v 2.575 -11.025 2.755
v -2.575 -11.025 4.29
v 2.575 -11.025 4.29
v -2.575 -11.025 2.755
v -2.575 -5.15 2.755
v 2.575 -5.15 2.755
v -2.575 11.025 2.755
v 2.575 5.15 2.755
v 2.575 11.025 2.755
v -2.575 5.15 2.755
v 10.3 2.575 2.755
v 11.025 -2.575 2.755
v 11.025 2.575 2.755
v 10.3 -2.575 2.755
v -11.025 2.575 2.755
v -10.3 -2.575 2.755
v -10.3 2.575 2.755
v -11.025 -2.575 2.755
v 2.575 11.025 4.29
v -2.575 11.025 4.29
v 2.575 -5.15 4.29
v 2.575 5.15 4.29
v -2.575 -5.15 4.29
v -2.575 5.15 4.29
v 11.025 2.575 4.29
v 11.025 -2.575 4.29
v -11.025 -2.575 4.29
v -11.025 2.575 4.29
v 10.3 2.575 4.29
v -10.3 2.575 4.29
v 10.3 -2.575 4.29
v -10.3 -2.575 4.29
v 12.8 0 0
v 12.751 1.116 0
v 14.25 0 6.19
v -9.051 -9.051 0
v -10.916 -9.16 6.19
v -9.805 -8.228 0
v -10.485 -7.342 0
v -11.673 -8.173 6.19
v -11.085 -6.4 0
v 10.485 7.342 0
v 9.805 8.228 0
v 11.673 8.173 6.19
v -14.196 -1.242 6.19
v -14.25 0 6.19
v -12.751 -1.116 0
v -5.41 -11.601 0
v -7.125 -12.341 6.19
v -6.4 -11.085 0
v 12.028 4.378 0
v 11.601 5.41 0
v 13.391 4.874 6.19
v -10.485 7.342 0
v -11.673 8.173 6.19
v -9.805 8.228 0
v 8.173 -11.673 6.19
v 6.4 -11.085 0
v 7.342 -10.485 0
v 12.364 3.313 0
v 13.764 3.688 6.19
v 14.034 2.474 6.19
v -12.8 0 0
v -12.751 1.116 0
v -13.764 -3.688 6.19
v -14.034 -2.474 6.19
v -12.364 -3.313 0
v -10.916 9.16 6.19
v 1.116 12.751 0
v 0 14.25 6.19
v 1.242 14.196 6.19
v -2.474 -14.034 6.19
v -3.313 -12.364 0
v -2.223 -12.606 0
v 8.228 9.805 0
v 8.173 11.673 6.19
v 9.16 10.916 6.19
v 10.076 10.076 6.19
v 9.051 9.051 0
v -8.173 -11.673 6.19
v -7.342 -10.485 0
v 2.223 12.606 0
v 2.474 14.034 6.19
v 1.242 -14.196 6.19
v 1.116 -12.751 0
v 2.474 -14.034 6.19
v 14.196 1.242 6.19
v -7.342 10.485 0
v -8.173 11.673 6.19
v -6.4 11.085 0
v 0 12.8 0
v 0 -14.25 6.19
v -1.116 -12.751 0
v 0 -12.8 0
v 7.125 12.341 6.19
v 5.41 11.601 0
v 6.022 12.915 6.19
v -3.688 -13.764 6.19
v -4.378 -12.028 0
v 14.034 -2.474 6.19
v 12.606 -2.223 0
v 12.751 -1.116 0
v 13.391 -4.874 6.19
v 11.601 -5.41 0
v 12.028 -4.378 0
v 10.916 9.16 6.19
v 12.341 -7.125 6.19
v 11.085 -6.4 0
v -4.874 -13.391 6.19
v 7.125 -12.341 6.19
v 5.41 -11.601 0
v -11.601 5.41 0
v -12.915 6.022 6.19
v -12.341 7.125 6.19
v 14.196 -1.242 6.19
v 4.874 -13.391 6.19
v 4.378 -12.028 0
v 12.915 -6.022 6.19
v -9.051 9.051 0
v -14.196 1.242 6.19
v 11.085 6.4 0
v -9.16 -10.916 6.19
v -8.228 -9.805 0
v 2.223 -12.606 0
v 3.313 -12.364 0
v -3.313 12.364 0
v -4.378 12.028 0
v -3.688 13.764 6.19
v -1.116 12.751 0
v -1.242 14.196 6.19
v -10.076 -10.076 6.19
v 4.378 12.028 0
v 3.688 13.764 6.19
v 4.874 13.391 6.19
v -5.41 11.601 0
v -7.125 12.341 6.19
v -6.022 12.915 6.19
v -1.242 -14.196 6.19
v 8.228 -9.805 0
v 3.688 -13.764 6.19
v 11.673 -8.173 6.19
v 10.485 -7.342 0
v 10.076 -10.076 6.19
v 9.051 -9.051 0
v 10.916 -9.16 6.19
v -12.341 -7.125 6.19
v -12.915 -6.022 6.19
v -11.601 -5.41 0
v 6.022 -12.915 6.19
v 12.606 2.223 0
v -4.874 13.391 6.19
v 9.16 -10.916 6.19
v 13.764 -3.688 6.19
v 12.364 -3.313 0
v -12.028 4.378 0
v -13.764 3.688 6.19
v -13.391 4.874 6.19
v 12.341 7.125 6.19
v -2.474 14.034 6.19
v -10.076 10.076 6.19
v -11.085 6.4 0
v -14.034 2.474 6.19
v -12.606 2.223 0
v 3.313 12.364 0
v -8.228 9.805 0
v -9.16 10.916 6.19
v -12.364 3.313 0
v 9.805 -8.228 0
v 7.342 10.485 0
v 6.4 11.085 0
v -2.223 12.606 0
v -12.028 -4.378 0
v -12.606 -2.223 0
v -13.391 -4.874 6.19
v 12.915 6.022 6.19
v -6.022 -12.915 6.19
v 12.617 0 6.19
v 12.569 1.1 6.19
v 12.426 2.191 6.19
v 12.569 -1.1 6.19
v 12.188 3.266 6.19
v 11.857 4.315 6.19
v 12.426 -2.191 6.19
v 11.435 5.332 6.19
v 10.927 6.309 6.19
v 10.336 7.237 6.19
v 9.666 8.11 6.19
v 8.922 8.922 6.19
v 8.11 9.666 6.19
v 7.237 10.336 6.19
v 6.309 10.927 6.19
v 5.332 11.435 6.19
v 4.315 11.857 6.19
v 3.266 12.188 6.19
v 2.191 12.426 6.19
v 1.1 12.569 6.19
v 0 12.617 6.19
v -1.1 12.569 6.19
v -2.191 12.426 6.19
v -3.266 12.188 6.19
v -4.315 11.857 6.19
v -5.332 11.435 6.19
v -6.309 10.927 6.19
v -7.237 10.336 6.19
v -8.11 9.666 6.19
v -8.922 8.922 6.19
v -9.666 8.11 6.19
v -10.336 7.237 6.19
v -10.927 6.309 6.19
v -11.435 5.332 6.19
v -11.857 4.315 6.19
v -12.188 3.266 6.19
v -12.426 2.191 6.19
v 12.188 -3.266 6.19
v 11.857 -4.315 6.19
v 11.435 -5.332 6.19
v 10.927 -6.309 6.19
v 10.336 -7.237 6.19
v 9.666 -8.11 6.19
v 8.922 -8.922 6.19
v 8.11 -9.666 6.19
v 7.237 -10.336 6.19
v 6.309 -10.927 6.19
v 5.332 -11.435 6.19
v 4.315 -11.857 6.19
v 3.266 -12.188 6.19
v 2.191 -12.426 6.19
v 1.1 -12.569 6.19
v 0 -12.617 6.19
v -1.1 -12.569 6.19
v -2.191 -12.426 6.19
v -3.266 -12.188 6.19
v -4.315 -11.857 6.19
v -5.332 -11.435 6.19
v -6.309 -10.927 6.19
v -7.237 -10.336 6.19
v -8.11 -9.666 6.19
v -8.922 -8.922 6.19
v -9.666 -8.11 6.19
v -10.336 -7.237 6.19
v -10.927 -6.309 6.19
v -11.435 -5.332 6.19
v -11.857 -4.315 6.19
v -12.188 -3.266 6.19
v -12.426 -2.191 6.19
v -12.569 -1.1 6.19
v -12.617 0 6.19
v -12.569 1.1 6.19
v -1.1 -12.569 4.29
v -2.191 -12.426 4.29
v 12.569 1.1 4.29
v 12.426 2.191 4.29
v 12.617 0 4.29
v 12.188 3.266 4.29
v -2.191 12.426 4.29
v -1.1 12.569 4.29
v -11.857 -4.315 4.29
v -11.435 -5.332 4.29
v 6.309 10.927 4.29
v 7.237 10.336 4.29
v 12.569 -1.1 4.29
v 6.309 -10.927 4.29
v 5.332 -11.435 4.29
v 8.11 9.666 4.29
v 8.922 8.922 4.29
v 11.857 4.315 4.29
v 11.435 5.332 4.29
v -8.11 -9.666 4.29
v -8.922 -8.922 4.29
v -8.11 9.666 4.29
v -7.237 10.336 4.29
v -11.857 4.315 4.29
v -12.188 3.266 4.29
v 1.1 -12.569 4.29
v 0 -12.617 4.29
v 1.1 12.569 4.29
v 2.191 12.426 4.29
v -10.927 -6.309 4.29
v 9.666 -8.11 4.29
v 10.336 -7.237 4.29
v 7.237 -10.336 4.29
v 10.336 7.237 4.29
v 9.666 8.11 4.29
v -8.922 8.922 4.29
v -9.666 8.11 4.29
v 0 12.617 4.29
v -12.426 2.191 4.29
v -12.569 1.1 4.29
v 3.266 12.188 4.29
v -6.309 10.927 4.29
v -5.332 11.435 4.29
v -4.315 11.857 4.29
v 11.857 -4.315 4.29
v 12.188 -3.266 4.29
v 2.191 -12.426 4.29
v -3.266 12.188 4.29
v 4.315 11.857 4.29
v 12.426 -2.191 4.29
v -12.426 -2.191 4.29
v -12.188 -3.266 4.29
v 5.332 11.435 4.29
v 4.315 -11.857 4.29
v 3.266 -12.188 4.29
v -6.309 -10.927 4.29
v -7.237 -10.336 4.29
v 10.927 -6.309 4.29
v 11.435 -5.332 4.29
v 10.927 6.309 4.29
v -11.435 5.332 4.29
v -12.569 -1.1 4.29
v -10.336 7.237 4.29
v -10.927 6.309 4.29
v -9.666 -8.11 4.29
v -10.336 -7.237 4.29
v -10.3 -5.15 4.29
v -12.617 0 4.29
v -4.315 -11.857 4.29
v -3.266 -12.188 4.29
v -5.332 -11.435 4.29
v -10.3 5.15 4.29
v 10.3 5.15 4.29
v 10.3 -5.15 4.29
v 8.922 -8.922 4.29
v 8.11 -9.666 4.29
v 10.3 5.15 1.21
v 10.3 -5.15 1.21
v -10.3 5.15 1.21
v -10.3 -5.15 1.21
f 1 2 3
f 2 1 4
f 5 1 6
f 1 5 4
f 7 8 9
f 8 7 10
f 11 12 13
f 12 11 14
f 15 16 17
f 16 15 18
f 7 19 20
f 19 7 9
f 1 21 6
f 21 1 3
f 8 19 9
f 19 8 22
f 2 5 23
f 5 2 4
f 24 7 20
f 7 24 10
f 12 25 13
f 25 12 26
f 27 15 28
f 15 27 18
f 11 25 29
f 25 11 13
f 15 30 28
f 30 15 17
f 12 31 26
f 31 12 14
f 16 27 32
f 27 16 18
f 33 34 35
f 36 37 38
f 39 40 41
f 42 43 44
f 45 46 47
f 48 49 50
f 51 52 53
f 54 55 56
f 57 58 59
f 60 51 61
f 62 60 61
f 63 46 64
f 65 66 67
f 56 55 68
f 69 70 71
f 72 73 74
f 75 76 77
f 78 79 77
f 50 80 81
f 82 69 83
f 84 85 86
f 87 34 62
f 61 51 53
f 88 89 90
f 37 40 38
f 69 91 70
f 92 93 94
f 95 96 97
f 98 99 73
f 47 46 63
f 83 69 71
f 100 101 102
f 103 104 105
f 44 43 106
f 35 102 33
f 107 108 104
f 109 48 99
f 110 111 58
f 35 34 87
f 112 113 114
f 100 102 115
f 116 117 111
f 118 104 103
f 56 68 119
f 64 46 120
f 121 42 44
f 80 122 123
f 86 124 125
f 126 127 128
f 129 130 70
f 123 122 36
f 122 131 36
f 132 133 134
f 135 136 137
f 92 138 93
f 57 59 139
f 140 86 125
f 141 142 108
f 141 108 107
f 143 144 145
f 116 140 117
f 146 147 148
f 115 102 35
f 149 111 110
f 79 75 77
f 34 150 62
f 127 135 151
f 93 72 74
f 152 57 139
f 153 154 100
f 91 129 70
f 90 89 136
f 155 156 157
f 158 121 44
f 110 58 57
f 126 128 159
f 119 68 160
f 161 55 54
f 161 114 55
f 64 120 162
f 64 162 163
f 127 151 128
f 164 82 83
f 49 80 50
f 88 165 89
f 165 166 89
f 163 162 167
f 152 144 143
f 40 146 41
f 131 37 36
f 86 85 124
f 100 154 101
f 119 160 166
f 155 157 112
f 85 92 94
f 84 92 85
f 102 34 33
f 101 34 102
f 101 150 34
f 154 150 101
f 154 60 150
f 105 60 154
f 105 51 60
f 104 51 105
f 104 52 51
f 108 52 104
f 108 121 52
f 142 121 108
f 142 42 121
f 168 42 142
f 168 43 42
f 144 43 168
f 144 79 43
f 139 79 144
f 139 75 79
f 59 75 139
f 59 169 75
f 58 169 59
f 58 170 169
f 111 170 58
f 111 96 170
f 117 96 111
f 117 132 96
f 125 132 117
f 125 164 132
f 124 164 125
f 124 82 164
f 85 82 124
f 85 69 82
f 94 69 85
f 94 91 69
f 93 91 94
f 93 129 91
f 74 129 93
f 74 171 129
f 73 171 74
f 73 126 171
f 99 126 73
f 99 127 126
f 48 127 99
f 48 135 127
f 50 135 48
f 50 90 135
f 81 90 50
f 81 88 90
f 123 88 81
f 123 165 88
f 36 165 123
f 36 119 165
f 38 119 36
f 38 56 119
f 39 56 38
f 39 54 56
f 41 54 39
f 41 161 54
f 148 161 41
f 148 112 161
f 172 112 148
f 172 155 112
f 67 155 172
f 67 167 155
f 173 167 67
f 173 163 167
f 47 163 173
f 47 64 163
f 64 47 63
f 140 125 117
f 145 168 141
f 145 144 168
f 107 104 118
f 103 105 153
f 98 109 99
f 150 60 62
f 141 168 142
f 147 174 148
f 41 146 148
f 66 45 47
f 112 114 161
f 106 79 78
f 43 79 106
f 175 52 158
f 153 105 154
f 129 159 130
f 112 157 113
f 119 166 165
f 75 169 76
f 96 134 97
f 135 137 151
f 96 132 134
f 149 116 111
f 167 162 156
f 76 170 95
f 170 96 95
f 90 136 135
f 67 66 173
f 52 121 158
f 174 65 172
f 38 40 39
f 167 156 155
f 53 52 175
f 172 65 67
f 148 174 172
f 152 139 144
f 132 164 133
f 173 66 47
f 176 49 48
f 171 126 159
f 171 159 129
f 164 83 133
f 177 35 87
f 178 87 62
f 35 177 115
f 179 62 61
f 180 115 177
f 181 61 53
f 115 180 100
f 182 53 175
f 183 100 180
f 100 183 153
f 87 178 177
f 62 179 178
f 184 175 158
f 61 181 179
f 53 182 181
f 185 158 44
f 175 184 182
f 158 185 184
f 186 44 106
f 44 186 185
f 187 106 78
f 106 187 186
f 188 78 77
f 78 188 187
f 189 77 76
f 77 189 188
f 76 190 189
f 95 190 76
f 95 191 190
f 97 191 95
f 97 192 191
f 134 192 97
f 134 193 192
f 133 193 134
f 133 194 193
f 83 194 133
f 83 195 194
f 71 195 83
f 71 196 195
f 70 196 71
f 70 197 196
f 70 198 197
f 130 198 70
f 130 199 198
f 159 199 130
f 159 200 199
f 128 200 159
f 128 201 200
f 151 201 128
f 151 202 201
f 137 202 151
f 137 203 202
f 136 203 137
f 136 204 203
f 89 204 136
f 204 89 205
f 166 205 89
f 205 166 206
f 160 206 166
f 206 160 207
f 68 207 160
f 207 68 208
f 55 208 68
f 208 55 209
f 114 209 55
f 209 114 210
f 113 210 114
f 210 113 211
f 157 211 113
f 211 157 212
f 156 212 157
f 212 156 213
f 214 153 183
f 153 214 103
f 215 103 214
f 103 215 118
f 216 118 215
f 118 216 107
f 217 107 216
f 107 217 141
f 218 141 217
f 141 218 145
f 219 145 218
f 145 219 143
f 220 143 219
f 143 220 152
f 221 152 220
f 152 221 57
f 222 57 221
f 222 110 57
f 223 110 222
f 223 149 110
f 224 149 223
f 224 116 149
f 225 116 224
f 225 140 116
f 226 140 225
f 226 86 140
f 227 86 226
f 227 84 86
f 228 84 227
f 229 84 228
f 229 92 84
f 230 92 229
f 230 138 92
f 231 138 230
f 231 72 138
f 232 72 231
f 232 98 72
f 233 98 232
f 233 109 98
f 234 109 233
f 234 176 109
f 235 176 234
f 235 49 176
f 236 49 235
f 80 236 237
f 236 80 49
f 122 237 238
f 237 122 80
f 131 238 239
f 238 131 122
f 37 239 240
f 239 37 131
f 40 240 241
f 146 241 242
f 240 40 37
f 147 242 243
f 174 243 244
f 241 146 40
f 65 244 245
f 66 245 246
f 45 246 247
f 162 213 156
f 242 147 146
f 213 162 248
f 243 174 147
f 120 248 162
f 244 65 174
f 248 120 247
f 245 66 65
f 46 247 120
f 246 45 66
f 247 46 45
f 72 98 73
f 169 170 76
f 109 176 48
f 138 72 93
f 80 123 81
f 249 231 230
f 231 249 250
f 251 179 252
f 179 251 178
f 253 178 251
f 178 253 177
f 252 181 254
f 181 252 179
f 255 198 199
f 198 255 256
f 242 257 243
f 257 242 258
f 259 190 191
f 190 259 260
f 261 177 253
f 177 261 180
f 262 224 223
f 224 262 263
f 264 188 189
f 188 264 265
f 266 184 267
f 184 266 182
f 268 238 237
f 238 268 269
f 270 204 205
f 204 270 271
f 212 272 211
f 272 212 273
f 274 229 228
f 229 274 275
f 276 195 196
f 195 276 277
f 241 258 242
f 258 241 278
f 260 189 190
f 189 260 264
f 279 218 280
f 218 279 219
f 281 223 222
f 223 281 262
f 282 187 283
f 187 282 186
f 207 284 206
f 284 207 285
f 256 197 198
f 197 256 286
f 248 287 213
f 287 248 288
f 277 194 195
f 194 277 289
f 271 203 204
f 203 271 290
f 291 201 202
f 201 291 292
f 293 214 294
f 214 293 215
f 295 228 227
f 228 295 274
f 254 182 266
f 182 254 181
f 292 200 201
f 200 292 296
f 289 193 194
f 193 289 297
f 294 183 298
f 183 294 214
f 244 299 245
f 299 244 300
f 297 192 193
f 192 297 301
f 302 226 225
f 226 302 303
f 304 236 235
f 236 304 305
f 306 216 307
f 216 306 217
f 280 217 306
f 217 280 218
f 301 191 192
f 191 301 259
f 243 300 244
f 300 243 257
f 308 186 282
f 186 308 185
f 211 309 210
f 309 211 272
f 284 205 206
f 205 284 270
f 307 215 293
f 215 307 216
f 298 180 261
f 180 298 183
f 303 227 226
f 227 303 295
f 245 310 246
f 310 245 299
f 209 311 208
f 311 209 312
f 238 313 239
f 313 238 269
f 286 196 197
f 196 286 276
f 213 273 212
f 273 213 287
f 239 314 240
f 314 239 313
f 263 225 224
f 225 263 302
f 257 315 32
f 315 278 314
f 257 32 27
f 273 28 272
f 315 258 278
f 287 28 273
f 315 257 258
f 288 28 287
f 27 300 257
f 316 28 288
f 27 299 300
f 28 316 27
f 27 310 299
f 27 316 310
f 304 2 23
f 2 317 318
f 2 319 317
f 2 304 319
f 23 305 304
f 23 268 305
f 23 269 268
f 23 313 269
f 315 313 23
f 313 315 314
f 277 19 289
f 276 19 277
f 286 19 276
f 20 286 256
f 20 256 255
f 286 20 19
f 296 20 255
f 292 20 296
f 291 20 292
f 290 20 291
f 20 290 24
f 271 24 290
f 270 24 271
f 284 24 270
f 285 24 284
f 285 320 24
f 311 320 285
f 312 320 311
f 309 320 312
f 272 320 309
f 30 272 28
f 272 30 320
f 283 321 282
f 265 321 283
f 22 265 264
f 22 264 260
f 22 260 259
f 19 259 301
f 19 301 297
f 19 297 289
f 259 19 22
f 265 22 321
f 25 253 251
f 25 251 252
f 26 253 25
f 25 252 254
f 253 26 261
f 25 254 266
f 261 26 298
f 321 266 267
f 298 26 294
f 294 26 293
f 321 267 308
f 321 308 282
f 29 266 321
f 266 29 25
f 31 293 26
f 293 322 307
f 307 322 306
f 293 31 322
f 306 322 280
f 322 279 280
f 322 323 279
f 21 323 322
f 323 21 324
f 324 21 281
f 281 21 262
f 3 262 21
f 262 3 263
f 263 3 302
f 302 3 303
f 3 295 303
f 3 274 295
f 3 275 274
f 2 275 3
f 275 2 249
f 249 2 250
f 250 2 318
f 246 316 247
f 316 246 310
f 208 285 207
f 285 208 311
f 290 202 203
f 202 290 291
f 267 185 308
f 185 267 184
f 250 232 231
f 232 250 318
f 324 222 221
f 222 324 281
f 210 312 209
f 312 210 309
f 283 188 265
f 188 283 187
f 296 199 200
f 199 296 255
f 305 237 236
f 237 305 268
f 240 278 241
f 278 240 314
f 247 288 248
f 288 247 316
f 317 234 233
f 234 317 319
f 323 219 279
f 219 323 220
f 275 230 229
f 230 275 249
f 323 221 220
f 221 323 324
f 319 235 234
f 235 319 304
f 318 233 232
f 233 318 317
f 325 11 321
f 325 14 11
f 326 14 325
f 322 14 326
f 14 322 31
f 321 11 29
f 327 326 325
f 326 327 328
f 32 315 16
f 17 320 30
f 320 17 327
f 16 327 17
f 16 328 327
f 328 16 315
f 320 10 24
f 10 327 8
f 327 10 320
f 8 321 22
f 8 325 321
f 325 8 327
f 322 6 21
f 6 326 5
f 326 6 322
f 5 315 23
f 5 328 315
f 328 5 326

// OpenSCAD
// [FL_INDEX: keywords="openscad, 3d_parametric, Coin_Magnet, csg_solid" | COT="Parametric OpenSCAD design from 3DCodeverse"]
// Title: Coin Magnet

/*
Coin Magnet Holder
Version 3 - 26 July 2015
Created by Aaron Ciuffo - txoof.com

This SCAD can produce a plate with many coins.  See the example at the bottom.

Many coins are already available; add more using this format:
//ISO4217_name<value>=[Diameter, Thickness]

Check the examples below.

To draw a single coin holder call (the function expects a list of lists)
  drawCoinHolder([[coinDiameter, coinThickness]]);
  

To draw a plate of several holders call:
  drawCoinHolder([coinvar1, coinvar2, coinvar3]);

!!!NOTE!!! the largest coin must be the first item in the list!



Adjust the magnet variables for your particlar magnet.  If your magnet does not
quite fit after printing, adjust the 'ovr' variable in the Tweaks section.



*/

/* [Variables] */

//Coin Diameter
coinDia=24.5;
//Coin Thickness
coinThick=1.9;


/*[Design]*/
//Border around coin
border=2;


/*[Magnet Dimensions]*/
//Magnet X - Longest dimension
magnetX=20;
//Magnet Y
magnetY=10;
//Magnet Z
magnetZ=3;
//Magnet Base Base Thickness
baseThick=1.2;

/*[Layout]*/
separation=5;

/*[Tweak]*/
//You may need to tweak this if you find your magnets do not fit.  
//Increase this variable to make more space, decrease it to make fits more tight.
ovr=1.03;

/*[Hidden]*/
magX=magnetX*ovr;
magY=magnetY*ovr;
magZ=magnetZ*ovr;

//Canadian dollar - CAD
cad1=[26.5, 2];
cad2=[27.95, 1.75];
cadp25=[24, 1.6];

//French Community of Africa - CFA
cfa10=[23.5, 1.5];
cfa50=[22, 1.7];
cfa200=[24.5, 1.9];

//Danish krone - DKK
dkk5=[28.5, 2];

//Spanish Pesetas - ESP
esp100=[24.5, 2.9];

//French franc - FRF
frf1=[24,1.9];

//Great Britian Pound - GBP
gbpp02=[26, 2.1];

//Greek drachma - GRD
grd50=[27.5, 2.2];
grd100=[29.5, 2.2];

//Icelanding Krone ISK
isk100=[25.6, 2.3];
isk50=[23.05, 2.7]; 
isk10=[27.55, 1.8];
isk5=[24.55, 1.8];
isk1=[21.5, 1.7];

//Irsih pound - IEP
iepp02=[26, 2];
iepp20=[27.1, 2];
//non round! - distance from point/point (even sided), or point/flat (odd sided)
iepp50=[30.5, 2.5, 7];
iep1=[31.1, 1.9];


//Italian lira - ITL
itl200=[24, 1.7];

//Lebanese pound - LBP
lbp500=[24.5, 2.15];

//Mexican Peso - MXN
mxn10=[28, 2.3];

//Dutch guilder - NLG
nlg1=[24.5, 1.9];

//Norwegian kroner - NOK
nok1=[21, 1.7];
nok5=[26, 2.15];
nok10=[24, 2.5];
nok20=[27.55, 2.5];

//Thai baht - THB
thb5=[24, 2.2];

//Turkish lira - TRY
try1=[26.25, 2];
tryp5=[23.9, 2];

//United States dollar - USD
usdp25=[24.3, 1.75];
usd1=[26.5, 2.1];



module drawCoinHolder(coinDim) {
  coinD=coinDim[0];
  coinZ=coinDim[1];
  cutOvr=.01; //add a little bit to fight ZFighting
  magBorder=5; //Consider calculating this form something or other
  $fn=72;
  height=coinZ+magZ+baseThick;
  difference() {
    //create external cone - add 
    cylinder(h=height, 
      r2=(coinD+(border*2))/2,  
      r1=(magX+magBorder)/2);

    //cut void for coin
    translate([0, 0, coinZ+magZ+baseThick-coinZ])
      color("red")
      cylinder(h=coinZ+cutOvr, r=coinD*ovr/2);

    //cut void for magnet
    translate([0, 0, magZ/2+baseThick+cutOvr])
      color("blue")
      cube([magX, magY, magZ], center=true);
    
    //cut void for glue grooves
    groove=[coinD*.9, magY*.5, magZ*.5];
    for (i=[-1, 0]) {
      rotate([0, 0, 90*i])
        color("yellow")
        translate([0, 0, height-coinZ-groove[2]/2+cutOvr])
        cube(groove, center=true);
    }

  }

}

module draw_nonround_holder(coinDim) {
  coinT=coinDim[1];
  coinSides=coinDim[2];
  coinD=2*(coinDim[0]/(cos((360/(2*coinSides)))+1));
  echo(coinD);
  difference () {
    // create external cylinder
    cylinder(h=coinT+magZ+.9, r2=(coinD+4)/2,  r1=((coinD+2.5)/2)*.8, $fn=36); 
    // cut out internal space for coin
    translate([0,0,magZ+.9]) cylinder(h=coinT*3, r=(coinD+.7)/2, $fn=coinSides);
    // cut out slot for magnet
    translate([-magX/2,-magY/2,.5]) cube([magX+.3, magY+.3, magZ*5]);
    // grooves for holding a bit of hot glue
    translate([0,0,(magZ*1.5)-.2]) cube([coinD*.8, magY*.2, magZ], center=true);
    translate([0,0,(magZ*1.5)-.2]) cube([magX*.2, coinD*.8, magZ], center=true);


  }
}

module layout(coins) {
  //find the largest coin in the list
  //BLAH!  This does not work. max([[a, b], [q, r]]) always returns element 0.
  //maxCoin=max(coins);

  maxCoin=coins[0];
  gridUnit=((maxCoin[0]+separation));

  //check to see if the number of coins in the list is square
  sqrTest=sqrt(len(coins))-floor(sqrt(len(coins)));

  //assign the next closest square number if it is not
  closestSq = sqrTest > 0 ? floor(sqrt(len(coins))+1) : sqrt(len(coins));
  
  //center the coins around the origin
  translate([-gridUnit*(closestSq-1)*.5, -gridUnit*(closestSq-1)*.5, 0])
  //work across the row, then the column  
  for (row = [0:closestSq-1]) {
    for(col = [0:closestSq-1]) {
      translate([gridUnit*col, gridUnit*row, 0])
        if (row*closestSq+col  <= len(coins)-1 ) {
          //determine the index number of the coin array
          drawCoinHolder(coins[row*closestSq+col]);
        } 
    }
  }

}

//layout([isk10, usd1, nok5, cfa50, gbpp02, nlg1, mxn10, esp100, usdp25]);

//layout([isk10, isk50, isk5, isk100]);

//layout([isk10, isk10, isk10, isk10]);

layout([[coinDia, coinThick]]);
